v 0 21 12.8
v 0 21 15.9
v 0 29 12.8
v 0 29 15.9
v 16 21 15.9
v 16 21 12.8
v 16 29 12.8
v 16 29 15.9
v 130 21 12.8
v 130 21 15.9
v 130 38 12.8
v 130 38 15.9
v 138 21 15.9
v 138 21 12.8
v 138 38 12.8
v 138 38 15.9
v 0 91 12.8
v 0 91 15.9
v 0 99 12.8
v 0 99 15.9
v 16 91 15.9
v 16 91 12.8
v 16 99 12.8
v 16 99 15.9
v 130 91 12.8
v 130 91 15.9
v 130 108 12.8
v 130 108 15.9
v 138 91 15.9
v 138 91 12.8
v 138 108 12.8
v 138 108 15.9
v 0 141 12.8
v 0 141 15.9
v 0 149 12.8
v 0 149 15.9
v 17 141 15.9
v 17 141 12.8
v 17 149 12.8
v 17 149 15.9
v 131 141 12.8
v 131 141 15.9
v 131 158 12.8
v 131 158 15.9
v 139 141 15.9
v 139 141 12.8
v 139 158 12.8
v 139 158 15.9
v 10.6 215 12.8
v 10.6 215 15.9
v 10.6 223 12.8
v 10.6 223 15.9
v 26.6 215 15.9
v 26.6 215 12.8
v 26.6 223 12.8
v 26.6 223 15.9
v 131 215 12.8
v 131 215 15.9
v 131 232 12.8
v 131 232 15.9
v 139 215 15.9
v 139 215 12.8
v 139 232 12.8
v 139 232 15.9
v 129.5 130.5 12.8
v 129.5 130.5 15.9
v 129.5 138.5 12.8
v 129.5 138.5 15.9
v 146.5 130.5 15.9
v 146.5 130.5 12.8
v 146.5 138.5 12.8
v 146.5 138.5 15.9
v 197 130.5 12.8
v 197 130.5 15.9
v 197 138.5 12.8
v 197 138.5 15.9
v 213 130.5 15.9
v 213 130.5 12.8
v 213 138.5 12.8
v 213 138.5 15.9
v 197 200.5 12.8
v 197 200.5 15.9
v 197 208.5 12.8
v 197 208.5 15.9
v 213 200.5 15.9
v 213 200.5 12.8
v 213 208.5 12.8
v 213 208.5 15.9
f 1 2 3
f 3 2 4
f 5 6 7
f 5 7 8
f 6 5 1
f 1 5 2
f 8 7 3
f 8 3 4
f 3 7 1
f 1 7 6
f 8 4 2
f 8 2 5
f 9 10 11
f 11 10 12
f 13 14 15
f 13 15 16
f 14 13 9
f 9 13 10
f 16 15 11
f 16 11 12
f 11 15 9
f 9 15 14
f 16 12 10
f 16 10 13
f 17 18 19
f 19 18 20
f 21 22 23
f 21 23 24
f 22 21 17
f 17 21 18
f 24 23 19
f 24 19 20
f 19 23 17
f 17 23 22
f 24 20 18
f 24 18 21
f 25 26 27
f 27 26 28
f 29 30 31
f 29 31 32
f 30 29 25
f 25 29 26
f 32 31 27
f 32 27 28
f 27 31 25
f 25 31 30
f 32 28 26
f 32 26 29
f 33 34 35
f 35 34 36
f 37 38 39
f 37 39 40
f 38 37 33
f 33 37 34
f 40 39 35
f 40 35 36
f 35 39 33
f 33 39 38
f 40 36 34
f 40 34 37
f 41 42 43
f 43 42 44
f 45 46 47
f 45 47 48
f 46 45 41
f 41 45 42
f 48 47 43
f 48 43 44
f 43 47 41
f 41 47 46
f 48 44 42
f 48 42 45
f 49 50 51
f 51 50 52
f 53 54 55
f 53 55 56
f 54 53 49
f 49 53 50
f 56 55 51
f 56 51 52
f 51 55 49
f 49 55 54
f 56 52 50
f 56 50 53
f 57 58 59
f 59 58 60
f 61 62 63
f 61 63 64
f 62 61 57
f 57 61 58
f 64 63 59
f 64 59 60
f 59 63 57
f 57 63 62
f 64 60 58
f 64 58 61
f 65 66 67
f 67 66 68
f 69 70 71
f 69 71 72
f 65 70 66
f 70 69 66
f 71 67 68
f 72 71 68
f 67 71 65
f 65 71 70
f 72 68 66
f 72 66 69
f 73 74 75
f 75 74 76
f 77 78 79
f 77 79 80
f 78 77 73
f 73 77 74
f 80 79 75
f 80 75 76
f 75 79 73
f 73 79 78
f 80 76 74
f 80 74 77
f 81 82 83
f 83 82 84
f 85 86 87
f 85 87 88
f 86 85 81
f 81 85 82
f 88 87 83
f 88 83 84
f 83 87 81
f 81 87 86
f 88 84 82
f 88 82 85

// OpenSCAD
// Generated by the canonical parent Python sources and validated exchange pipeline.
polyhedron(points=[[0.0, 21.0, 12.800000190734863], [0.0, 21.0, 15.899999618530273], [0.0, 29.0, 12.800000190734863], [0.0, 29.0, 15.899999618530273], [16.0, 21.0, 15.899999618530273], [16.0, 21.0, 12.800000190734863], [16.0, 29.0, 12.800000190734863], [16.0, 29.0, 15.899999618530273], [130.0, 21.0, 12.800000190734863], [130.0, 21.0, 15.899999618530273], [130.0, 38.0, 12.800000190734863], [130.0, 38.0, 15.899999618530273], [138.0, 21.0, 15.899999618530273], [138.0, 21.0, 12.800000190734863], [138.0, 38.0, 12.800000190734863], [138.0, 38.0, 15.899999618530273], [0.0, 91.0, 12.800000190734863], [0.0, 91.0, 15.899999618530273], [0.0, 99.0, 12.800000190734863], [0.0, 99.0, 15.899999618530273], [16.0, 91.0, 15.899999618530273], [16.0, 91.0, 12.800000190734863], [16.0, 99.0, 12.800000190734863], [16.0, 99.0, 15.899999618530273], [130.0, 91.0, 12.800000190734863], [130.0, 91.0, 15.899999618530273], [130.0, 108.0, 12.800000190734863], [130.0, 108.0, 15.899999618530273], [138.0, 91.0, 15.899999618530273], [138.0, 91.0, 12.800000190734863], [138.0, 108.0, 12.800000190734863], [138.0, 108.0, 15.899999618530273], [0.0, 141.0, 12.800000190734863], [0.0, 141.0, 15.899999618530273], [0.0, 149.0, 12.800000190734863], [0.0, 149.0, 15.899999618530273], [17.0, 141.0, 15.899999618530273], [17.0, 141.0, 12.800000190734863], [17.0, 149.0, 12.800000190734863], [17.0, 149.0, 15.899999618530273], [131.0, 141.0, 12.800000190734863], [131.0, 141.0, 15.899999618530273], [131.0, 158.0, 12.800000190734863], [131.0, 158.0, 15.899999618530273], [139.0, 141.0, 15.899999618530273], [139.0, 141.0, 12.800000190734863], [139.0, 158.0, 12.800000190734863], [139.0, 158.0, 15.899999618530273], [10.600000381469727, 215.0, 12.800000190734863], [10.600000381469727, 215.0, 15.899999618530273], [10.600000381469727, 223.0, 12.800000190734863], [10.600000381469727, 223.0, 15.899999618530273], [26.600000381469727, 215.0, 15.899999618530273], [26.600000381469727, 215.0, 12.800000190734863], [26.600000381469727, 223.0, 12.800000190734863], [26.600000381469727, 223.0, 15.899999618530273], [131.0, 215.0, 12.800000190734863], [131.0, 215.0, 15.899999618530273], [131.0, 232.0, 12.800000190734863], [131.0, 232.0, 15.899999618530273], [139.0, 215.0, 15.899999618530273], [139.0, 215.0, 12.800000190734863], [139.0, 232.0, 12.800000190734863], [139.0, 232.0, 15.899999618530273], [129.5, 130.5, 12.800000190734863], [129.5, 130.5, 15.899999618530273], [129.5, 138.5, 12.800000190734863], [129.5, 138.5, 15.899999618530273], [146.5, 130.5, 15.899999618530273], [146.5, 130.5, 12.800000190734863], [146.5, 138.5, 12.800000190734863], [146.5, 138.5, 15.899999618530273], [197.0, 130.5, 12.800000190734863], [197.0, 130.5, 15.899999618530273], [197.0, 138.5, 12.800000190734863], [197.0, 138.5, 15.899999618530273], [213.0, 130.5, 15.899999618530273], [213.0, 130.5, 12.800000190734863], [213.0, 138.5, 12.800000190734863], [213.0, 138.5, 15.899999618530273], [197.0, 200.5, 12.800000190734863], [197.0, 200.5, 15.899999618530273], [197.0, 208.5, 12.800000190734863], [197.0, 208.5, 15.899999618530273], [213.0, 200.5, 15.899999618530273], [213.0, 200.5, 12.800000190734863], [213.0, 208.5, 12.800000190734863], [213.0, 208.5, 15.899999618530273]],faces=[[2, 1, 0], [3, 1, 2], [6, 5, 4], [7, 6, 4], [0, 4, 5], [1, 4, 0], [2, 6, 7], [3, 2, 7], [0, 6, 2], [5, 6, 0], [1, 3, 7], [4, 1, 7], [10, 9, 8], [11, 9, 10], [14, 13, 12], [15, 14, 12], [8, 12, 13], [9, 12, 8], [10, 14, 15], [11, 10, 15], [8, 14, 10], [13, 14, 8], [9, 11, 15], [12, 9, 15], [18, 17, 16], [19, 17, 18], [22, 21, 20], [23, 22, 20], [16, 20, 21], [17, 20, 16], [18, 22, 23], [19, 18, 23], [16, 22, 18], [21, 22, 16], [17, 19, 23], [20, 17, 23], [26, 25, 24], [27, 25, 26], [30, 29, 28], [31, 30, 28], [24, 28, 29], [25, 28, 24], [26, 30, 31], [27, 26, 31], [24, 30, 26], [29, 30, 24], [25, 27, 31], [28, 25, 31], [34, 33, 32], [35, 33, 34], [38, 37, 36], [39, 38, 36], [32, 36, 37], [33, 36, 32], [34, 38, 39], [35, 34, 39], [32, 38, 34], [37, 38, 32], [33, 35, 39], [36, 33, 39], [42, 41, 40], [43, 41, 42], [46, 45, 44], [47, 46, 44], [40, 44, 45], [41, 44, 40], [42, 46, 47], [43, 42, 47], [40, 46, 42], [45, 46, 40], [41, 43, 47], [44, 41, 47], [50, 49, 48], [51, 49, 50], [54, 53, 52], [55, 54, 52], [48, 52, 53], [49, 52, 48], [50, 54, 55], [51, 50, 55], [48, 54, 50], [53, 54, 48], [49, 51, 55], [52, 49, 55], [58, 57, 56], [59, 57, 58], [62, 61, 60], [63, 62, 60], [56, 60, 61], [57, 60, 56], [58, 62, 63], [59, 58, 63], [56, 62, 58], [61, 62, 56], [57, 59, 63], [60, 57, 63], [66, 65, 64], [67, 65, 66], [70, 69, 68], [71, 70, 68], [65, 69, 64], [65, 68, 69], [67, 66, 70], [67, 70, 71], [64, 70, 66], [69, 70, 64], [65, 67, 71], [68, 65, 71], [74, 73, 72], [75, 73, 74], [78, 77, 76], [79, 78, 76], [72, 76, 77], [73, 76, 72], [74, 78, 79], [75, 74, 79], [72, 78, 74], [77, 78, 72], [73, 75, 79], [76, 73, 79], [82, 81, 80], [83, 81, 82], [86, 85, 84], [87, 86, 84], [80, 84, 85], [81, 84, 80], [82, 86, 87], [83, 82, 87], [80, 86, 82], [85, 86, 80], [81, 83, 87], [84, 81, 87]],convexity=10);
